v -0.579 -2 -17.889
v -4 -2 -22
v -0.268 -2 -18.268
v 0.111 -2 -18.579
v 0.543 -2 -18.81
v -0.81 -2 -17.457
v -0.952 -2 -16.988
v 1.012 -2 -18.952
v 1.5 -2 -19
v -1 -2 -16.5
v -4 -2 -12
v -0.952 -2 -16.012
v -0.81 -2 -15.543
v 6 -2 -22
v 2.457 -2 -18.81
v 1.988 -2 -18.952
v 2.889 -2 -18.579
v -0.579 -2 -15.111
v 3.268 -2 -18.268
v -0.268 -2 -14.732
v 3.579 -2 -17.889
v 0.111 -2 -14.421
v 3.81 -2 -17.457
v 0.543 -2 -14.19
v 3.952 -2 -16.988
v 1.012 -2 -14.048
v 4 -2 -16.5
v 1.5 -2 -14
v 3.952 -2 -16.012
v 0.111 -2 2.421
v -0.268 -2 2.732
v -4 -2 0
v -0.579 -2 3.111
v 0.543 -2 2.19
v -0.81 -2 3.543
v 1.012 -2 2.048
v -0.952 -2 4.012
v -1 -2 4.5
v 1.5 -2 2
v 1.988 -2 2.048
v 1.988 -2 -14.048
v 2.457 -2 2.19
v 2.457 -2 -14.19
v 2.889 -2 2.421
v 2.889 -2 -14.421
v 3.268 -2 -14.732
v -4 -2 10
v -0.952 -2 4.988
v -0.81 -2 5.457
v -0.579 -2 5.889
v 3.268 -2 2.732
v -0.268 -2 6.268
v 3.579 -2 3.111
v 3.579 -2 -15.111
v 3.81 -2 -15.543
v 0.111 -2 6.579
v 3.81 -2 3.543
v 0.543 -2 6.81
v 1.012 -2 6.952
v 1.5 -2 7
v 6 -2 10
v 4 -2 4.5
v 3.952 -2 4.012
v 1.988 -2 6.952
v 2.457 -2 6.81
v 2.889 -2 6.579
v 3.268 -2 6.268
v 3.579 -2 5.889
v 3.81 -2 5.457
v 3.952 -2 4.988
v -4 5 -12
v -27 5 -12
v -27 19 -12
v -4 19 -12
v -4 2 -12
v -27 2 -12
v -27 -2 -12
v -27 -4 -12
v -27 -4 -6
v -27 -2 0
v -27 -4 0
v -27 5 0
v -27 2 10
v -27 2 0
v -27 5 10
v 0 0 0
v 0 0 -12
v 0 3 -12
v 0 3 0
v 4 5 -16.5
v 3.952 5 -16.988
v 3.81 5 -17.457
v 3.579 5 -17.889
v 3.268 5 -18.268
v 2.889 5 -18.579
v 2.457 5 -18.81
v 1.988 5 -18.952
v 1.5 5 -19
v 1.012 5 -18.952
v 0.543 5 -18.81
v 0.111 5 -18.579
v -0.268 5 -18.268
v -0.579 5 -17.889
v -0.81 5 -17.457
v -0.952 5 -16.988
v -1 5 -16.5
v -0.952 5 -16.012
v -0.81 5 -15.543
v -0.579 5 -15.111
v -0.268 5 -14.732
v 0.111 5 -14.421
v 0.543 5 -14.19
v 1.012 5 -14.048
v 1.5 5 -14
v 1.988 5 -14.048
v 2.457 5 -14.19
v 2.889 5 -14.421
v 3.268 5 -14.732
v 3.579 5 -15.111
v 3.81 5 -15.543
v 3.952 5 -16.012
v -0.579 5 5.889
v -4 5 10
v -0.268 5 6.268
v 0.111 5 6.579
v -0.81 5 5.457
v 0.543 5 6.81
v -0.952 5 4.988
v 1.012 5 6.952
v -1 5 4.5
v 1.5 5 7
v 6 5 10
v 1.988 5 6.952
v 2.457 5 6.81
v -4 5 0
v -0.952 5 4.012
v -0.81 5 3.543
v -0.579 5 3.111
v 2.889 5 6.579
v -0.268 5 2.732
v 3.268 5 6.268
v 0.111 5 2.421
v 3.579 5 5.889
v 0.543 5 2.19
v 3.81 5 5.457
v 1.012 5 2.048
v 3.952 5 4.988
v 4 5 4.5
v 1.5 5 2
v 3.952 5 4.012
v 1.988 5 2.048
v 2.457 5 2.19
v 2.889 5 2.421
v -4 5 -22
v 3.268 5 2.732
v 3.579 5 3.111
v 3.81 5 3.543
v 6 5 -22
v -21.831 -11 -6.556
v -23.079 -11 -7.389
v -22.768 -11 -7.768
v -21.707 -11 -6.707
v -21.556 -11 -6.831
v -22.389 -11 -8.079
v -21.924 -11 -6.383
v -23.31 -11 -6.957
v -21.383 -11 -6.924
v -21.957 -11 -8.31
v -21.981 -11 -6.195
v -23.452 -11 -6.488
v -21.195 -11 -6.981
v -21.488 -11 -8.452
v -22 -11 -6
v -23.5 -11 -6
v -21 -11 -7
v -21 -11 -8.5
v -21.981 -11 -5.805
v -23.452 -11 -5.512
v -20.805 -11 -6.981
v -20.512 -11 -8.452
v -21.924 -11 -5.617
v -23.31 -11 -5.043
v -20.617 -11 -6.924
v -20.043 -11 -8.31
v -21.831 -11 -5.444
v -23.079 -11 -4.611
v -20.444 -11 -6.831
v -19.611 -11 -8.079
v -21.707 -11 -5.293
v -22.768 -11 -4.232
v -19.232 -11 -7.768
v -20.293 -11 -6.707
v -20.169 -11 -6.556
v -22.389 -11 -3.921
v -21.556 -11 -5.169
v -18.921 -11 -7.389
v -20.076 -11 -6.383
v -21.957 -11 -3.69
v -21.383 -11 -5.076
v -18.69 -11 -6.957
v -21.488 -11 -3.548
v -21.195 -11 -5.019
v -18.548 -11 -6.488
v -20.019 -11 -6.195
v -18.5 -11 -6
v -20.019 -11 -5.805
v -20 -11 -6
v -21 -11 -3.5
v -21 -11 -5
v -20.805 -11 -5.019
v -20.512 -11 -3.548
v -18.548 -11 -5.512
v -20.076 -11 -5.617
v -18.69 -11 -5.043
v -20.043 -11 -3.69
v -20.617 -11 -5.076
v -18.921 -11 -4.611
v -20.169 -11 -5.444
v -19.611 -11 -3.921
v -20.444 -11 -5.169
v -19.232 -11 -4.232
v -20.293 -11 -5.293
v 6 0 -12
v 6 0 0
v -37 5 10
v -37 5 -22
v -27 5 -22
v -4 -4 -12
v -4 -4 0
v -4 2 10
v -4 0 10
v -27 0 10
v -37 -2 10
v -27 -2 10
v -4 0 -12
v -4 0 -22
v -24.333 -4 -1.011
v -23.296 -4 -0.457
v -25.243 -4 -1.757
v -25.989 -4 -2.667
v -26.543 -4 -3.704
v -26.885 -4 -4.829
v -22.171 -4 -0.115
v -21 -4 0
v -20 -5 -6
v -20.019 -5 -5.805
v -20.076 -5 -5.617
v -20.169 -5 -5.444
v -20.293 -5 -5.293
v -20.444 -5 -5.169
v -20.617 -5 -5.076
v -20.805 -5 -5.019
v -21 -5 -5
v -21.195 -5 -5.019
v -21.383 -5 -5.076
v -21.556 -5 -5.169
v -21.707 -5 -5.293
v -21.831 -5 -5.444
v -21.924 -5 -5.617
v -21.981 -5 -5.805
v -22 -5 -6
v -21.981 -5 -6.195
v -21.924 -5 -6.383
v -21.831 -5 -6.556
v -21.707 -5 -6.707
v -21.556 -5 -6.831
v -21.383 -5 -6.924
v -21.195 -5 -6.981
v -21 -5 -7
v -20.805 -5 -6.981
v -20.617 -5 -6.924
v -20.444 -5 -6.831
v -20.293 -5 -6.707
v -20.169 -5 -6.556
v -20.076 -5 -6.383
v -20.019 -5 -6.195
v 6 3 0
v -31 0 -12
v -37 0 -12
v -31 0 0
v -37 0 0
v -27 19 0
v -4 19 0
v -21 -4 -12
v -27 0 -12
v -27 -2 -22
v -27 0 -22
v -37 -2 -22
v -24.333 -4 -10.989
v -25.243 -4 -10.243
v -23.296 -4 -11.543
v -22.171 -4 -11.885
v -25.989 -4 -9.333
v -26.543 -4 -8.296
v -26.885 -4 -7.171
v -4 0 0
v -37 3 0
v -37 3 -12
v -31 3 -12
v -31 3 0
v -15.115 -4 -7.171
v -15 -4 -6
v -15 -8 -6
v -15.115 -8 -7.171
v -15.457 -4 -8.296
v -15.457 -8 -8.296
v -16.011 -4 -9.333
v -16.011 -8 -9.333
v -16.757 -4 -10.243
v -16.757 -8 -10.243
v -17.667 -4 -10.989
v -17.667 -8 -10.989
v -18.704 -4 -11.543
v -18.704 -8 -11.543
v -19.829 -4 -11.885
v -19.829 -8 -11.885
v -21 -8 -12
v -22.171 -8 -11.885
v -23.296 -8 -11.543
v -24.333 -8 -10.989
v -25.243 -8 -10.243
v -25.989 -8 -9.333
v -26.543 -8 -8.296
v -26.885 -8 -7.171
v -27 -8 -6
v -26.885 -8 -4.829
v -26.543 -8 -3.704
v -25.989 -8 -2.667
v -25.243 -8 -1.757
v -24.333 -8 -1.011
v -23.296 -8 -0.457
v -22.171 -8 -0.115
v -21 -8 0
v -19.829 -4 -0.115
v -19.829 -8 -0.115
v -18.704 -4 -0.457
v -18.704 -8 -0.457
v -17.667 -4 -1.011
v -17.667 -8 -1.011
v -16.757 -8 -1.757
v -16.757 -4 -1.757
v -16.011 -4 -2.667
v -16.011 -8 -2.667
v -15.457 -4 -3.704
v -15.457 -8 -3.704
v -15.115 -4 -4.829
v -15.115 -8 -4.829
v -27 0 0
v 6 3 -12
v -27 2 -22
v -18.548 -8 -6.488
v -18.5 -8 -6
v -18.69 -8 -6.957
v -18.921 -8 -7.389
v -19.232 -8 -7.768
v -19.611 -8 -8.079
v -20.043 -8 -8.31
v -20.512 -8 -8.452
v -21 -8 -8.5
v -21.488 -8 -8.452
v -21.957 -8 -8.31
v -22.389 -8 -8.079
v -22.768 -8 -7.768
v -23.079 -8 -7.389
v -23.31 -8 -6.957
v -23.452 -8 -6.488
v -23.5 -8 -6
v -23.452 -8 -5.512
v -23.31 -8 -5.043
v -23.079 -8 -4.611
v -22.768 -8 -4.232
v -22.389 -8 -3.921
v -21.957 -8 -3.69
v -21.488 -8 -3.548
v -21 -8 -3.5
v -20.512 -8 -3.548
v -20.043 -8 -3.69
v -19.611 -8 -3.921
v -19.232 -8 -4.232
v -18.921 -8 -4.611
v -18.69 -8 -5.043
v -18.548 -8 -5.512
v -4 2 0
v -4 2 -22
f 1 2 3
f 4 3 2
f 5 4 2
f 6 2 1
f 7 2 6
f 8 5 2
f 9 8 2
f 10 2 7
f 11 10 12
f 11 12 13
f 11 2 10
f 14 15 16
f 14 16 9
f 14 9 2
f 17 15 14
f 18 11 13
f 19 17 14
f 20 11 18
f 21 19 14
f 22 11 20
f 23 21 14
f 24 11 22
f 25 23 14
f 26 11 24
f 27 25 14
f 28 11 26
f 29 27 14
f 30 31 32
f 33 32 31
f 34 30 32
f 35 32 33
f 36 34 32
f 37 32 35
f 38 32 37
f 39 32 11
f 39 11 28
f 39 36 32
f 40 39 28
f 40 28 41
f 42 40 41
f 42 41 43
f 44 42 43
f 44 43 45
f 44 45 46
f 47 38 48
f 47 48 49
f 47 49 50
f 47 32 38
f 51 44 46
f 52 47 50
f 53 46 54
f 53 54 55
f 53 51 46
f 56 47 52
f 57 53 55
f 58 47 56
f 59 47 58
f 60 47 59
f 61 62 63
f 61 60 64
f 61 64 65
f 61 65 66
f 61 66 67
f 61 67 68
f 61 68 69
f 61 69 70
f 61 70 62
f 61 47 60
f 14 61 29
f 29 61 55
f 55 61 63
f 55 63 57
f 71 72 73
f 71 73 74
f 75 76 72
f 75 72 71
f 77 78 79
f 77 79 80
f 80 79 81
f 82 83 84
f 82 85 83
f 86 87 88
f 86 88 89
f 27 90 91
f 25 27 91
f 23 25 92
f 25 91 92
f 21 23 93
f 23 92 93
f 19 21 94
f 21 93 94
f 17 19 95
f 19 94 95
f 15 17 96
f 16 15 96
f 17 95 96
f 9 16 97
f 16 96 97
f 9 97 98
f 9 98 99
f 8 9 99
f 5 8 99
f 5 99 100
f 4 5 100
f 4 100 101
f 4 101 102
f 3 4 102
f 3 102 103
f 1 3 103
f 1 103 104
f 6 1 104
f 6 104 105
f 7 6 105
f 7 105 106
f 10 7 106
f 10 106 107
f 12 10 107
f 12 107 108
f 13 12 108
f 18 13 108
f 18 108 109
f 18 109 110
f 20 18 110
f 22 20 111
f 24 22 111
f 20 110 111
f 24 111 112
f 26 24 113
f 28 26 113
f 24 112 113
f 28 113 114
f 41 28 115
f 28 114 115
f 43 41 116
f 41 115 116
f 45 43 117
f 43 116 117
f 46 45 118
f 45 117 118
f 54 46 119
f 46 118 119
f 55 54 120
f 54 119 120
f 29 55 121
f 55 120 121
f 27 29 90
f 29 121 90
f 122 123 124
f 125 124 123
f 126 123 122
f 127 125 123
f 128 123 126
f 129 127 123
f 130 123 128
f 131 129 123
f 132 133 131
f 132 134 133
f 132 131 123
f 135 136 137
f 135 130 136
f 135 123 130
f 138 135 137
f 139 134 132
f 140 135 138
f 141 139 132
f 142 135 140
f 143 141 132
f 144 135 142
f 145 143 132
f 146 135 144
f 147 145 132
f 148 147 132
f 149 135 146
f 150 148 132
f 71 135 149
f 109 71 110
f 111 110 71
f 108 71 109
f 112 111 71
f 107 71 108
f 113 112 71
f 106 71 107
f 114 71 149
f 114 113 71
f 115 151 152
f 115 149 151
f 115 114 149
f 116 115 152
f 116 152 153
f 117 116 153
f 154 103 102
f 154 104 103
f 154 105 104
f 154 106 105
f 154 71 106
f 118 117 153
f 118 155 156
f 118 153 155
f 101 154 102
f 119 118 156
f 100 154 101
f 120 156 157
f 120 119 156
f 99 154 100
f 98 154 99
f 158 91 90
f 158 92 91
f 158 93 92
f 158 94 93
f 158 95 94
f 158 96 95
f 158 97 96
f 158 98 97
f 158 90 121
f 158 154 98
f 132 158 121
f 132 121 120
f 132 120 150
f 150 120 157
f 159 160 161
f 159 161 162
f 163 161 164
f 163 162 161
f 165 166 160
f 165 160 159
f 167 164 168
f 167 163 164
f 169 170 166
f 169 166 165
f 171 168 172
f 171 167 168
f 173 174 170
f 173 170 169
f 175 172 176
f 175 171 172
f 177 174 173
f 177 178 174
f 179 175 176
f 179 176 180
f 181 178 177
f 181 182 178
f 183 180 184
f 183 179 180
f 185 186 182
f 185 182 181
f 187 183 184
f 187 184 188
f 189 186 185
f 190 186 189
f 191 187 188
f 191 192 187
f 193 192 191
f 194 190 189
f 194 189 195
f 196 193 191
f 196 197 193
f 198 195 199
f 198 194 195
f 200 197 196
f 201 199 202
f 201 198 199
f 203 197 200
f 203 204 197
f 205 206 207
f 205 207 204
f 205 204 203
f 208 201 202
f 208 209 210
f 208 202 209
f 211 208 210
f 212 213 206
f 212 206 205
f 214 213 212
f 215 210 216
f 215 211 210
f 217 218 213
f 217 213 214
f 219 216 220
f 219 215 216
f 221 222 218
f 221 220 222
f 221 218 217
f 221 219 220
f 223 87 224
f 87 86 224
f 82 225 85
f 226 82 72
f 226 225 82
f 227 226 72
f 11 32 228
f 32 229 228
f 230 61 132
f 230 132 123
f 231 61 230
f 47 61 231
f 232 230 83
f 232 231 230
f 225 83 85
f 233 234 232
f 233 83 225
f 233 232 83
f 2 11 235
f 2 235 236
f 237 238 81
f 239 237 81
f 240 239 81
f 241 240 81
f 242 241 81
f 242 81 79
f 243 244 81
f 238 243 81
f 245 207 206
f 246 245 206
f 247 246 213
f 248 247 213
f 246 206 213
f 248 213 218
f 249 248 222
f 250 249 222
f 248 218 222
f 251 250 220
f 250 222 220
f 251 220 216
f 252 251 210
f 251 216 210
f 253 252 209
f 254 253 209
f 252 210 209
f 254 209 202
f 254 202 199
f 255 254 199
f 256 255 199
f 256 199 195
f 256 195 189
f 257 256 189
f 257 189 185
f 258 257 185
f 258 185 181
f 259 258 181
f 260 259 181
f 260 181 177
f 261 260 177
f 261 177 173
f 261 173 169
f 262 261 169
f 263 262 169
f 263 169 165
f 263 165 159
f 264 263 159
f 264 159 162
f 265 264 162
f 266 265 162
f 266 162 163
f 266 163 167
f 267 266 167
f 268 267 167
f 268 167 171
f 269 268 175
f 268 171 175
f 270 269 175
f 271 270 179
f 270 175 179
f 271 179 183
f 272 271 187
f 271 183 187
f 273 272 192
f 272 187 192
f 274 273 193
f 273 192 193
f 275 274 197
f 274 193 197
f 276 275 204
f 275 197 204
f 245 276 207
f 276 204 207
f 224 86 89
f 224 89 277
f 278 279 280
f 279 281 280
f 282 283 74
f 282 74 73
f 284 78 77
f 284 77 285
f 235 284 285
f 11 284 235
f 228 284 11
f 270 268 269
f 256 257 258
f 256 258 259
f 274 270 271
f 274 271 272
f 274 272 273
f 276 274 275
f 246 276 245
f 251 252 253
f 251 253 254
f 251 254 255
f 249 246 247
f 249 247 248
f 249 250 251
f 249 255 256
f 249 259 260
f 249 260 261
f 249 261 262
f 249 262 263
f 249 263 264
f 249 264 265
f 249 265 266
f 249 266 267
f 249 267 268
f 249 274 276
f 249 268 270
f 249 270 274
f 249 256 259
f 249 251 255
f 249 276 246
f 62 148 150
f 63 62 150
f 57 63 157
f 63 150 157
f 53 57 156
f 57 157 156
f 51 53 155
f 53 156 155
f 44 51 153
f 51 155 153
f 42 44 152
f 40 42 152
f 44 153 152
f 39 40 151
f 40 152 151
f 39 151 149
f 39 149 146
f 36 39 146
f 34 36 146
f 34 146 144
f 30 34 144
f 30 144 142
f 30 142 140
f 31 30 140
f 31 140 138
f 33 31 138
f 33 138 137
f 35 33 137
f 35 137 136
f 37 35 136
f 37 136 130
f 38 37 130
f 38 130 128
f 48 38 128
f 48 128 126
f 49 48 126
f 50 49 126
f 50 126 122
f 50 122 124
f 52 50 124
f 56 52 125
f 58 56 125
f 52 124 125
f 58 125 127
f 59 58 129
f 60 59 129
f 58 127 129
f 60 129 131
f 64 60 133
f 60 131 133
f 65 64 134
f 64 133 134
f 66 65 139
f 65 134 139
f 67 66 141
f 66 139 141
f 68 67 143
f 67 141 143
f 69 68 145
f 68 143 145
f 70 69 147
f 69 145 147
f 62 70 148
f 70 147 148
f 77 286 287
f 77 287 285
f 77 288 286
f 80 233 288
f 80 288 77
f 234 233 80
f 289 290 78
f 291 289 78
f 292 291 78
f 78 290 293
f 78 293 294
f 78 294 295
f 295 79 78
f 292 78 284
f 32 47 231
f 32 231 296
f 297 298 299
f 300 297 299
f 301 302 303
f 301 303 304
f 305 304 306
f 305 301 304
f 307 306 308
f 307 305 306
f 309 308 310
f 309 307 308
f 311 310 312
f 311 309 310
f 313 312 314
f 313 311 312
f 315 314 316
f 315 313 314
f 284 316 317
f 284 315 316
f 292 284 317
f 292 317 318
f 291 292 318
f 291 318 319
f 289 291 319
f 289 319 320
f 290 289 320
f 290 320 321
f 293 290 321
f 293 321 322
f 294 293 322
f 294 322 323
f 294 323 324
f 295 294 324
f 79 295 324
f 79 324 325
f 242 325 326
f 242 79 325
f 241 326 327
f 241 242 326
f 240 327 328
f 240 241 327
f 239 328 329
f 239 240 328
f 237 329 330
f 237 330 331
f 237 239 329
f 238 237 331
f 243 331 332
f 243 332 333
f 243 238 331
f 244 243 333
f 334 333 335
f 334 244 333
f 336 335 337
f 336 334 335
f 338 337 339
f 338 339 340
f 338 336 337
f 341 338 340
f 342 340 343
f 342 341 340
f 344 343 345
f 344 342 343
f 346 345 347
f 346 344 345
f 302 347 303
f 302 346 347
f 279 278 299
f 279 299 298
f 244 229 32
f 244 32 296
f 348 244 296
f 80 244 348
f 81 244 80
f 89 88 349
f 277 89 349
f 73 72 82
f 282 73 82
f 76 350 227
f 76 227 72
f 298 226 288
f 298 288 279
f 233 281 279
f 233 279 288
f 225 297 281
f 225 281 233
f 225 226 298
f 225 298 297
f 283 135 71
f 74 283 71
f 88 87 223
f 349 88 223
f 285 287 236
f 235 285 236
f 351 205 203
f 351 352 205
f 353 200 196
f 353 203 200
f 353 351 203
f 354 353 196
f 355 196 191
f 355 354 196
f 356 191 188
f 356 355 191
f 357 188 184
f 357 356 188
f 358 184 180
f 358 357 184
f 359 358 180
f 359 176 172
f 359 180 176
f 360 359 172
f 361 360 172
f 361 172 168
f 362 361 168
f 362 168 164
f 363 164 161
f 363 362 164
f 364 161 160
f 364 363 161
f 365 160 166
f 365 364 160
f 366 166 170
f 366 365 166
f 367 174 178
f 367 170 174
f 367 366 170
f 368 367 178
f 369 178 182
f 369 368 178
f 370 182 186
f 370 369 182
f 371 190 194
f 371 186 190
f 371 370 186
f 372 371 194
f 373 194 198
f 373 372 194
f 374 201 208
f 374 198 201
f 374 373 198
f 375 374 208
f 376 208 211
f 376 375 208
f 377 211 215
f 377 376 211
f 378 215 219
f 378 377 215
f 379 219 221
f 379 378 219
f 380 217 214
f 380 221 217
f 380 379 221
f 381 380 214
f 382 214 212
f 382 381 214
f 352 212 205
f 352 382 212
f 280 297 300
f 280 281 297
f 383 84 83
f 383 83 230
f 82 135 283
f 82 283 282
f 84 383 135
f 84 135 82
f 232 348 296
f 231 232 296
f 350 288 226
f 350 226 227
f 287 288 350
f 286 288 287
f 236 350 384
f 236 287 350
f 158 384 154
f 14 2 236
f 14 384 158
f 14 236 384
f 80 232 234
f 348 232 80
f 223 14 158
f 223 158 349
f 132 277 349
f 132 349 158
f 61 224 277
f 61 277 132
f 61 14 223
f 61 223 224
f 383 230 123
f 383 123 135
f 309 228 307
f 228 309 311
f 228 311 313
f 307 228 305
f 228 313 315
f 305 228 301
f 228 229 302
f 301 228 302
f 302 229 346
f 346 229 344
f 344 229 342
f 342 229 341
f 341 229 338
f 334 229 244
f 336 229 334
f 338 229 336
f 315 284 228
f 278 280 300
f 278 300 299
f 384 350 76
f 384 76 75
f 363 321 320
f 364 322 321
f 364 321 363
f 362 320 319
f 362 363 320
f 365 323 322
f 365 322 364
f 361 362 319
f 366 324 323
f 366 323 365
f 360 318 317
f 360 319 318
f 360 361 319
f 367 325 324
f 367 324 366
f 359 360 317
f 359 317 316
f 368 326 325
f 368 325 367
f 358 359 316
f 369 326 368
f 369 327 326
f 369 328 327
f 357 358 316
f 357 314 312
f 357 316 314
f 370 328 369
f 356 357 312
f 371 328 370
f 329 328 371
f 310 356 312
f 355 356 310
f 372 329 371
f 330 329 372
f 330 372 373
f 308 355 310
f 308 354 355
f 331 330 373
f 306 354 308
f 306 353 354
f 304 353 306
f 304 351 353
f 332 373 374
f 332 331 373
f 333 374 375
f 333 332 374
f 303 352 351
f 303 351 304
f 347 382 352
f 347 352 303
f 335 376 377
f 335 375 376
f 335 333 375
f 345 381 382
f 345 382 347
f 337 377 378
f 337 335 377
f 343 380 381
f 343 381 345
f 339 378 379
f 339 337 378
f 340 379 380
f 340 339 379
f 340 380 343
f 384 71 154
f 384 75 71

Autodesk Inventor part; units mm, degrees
ref_plane "YZ Plane" through (0, 0, 0) normal (1, 0, 0) x (0, 1, 0)
ref_plane "XZ Plane" through (0, 0, 0) normal (0, 1, 0) x (-1, 0, 0)
ref_plane "XY Plane" through (0, 0, 0) normal (0, 0, 1) x (1, 0, 0)
sketch "Sketch1" plane through (0, 0, 0) normal (0, 1, 0) x (-1, 0, 0)
  line L0 (0, 0) -> (31, 0)
  line L1 (31, 0) -> (31, -12)
  line L2 (31, -12) -> (0, -12)
  line L3 (0, -12) -> (0, 0)
  line L4 (4, -12) -> (27, -12)
  line L5 (27, -12) -> (27, 0)
  line L6 (27, 0) -> (4, 0)
  line L7 (4, 0) -> (4, -12)
  point P0 (27, 0)
  point P1 (4, 0)
  dimension "d230" = 31
  dimension "d231" = 12
  dimension "d232" = 23
  dimension "d234" = 4
extrude "Extrusion1" add sketch "Sketch1" along normal blind 3 contours L0 L7 L2 L3 | L0 L1 L2 L5
extrude "Extrusion2" add sketch "Sketch1" along normal blind 19 and the other way blind 4 contours L0 L5 L2 L7
sketch "Sketch2" plane through (0, 3, 0) normal (0, 1, 0) x (1, 0, 0)
  line L0 (-27, -10) -> (-37, -10)
  line L1 (-37, -10) -> (-37, 22)
  line L2 (-37, 22) -> (-27, 22)
  line L3 (-27, 22) -> (-27, -10)
  line L4 (-27, 12) -> (-27, 0) projected
  line L5 (-4, 22) -> (6, 22)
  line L6 (6, 22) -> (6, -10)
  line L7 (6, -10) -> (-4, -10)
  line L8 (-4, -10) -> (-4, 22)
  line L9 (-4, 0) -> (-4, 12) projected
  point P0 (0, 0)
  point P1 (-27, 6)
  point P2 (-27, 6)
  point P3 (-27, 6)
  point P4 (-4, 6)
  point P5 (-4, 6)
  point P6 (-4, 6)
  dimension "d241" = 10
  dimension "d242" = 32
  dimension "d243" = 10
  dimension "d244" = 32
extrude "Extrusion3" add sketch "Sketch2" along normal blind 2
sketch "Sketch3" plane through (0, 0, 0) normal (0, -1, 0) x (1, 0, 0)
  line L0 (-37, -22) -> (-37, 10) projected
  line L1 (-27, -12) -> (-27, -22) projected
  line L2 (-37, 10) -> (-27, 10)
  line L3 (-27, 10) -> (-27, -22)
  line L4 (-27, -22) -> (-37, -22)
  line L5 (-37, -22) -> (-37, 10)
  line L6 (6, -22) -> (-4, -22) projected
  line L7 (6, 10) -> (6, -22) projected
  line L8 (-4, -22) -> (6, -22)
  line L9 (6, -22) -> (6, 10)
  line L10 (6, 10) -> (-4, 10)
  line L11 (-4, 10) -> (-4, -22)
  point P0 (0, 0)
extrude "Extrusion4" add sketch "Sketch3" along normal blind 2
sketch "Sketch4" plane through (0, 0, 0) normal (0, 1, 0) x (1, 0, 0)
  line L0 (-4, 22) -> (-4, 12) projected
  line L1 (6, -10) -> (-4, -10)
  line L2 (-4, 22) -> (6, 22)
  line L3 (-27, 22) -> (-37, 22) projected
  line L4 (-27, 22) -> (-37, 22)
  line L5 (-37, 22) -> (-37, -10)
  line L6 (-37, -10) -> (-27, -10)
  line L7 (-4, 0) -> (-27, 0) projected
  line L8 (6, -10) -> (-4, -10)
  line L9 (-4, -10) -> (-4, 0)
  line L10 (-4, 0) -> (6, 0)
  line L11 (6, 0) -> (6, -10)
  line L12 (-27, -10) -> (-37, -10)
  line L13 (-37, -10) -> (-37, 0)
  line L14 (-37, 0) -> (-27, 0)
  line L15 (-27, 0) -> (-27, -10)
  line L16 (-27, 12) -> (-37, 12)
  line L17 (-37, 12) -> (-37, 22)
  line L18 (-37, 22) -> (-27, 22)
  line L19 (-27, 22) -> (-27, 12)
  line L20 (0, 12) -> (-4, 12) projected
  line L21 (-4, 22) -> (6, 22) projected
  line L22 (-4, 12) -> (6, 12)
  line L23 (6, 12) -> (6, 22)
  line L24 (6, 22) -> (-4, 22)
  line L25 (-4, 22) -> (-4, 12)
  line L26 (-37, 22) -> (-37, -10) projected
  line L27 (-37, 22) -> (6, 22)
  line L28 (6, 22) -> (6, 12)
  line L29 (6, 12) -> (-37, 12)
  line L30 (-37, 12) -> (-37, 22)
  line L31 (6, -10) -> (-37, -10)
  line L32 (-37, -10) -> (-37, 0)
  line L33 (-37, 0) -> (6, 0)
  line L34 (6, 0) -> (6, -10)
  point P0 (0, 0)
extrude "Extrusion5" add sketch "Sketch4" along normal blind 3 contours L2 L23 L22 L20 L0 | L14 L15 L6 L5 | L19 L16 L5 L3 | L10 L11 L1 L9
extrude "Extrusion6" add sketch "Sketch4" along normal blind 2
sketch "Sketch5" plane through (0, -4, 0) normal (0, -1, 0) x (1, 0, 0)
  circle A0 centre (-21, -6) radius 6
  line L0 (-4, 0) -> (-27, 0) projected
  line L1 (-27, 0) -> (-27, -12) projected
  point P0 (0, 0)
  dimension "d255" = 12
  dimension "d256" = 6
  dimension "d257" = 6
extrude "Extrusion7" add sketch "Sketch5" along normal blind 4 contours A0
sketch "Sketch6" plane through (-21, -8, -6) normal (0, -1, 0) x (1, 0, 0)
  circle A0 centre (0, 0) radius 2.5
  circle A1 centre (0, 0) radius 6 projected
  point P0 (21, 6)
  dimension "d260" = 5
  dimension "d261" = 3.5
extrude "Extrusion8" add sketch "Sketch6" along normal blind 3 contours A0
sketch "Sketch7" plane through (-21, -11, -6) normal (0, -1, 0) x (1, 0, 0)
  line L0 (-6, -6) -> (0, -6) projected
  line L1 (-6, 6) -> (-6, 0) projected
  circle A0 centre (0, 0) radius 1
  point P0 (21, 6)
  dimension "d266" = 2
  dimension "d267" = 6
  dimension "d268" = 6
extrude "Extrusion9" cut sketch "Sketch7" against normal blind 6
sketch "Sketch22" plane through (0, 5, 0) normal (0, 1, 0) x (1, 0, 0)
  circle A0 centre (1.5, -4.5) radius 2.5
  circle A1 centre (1.5, 16.5) radius 2.5
  line L0 (-4, 22) -> (-4, 12) projected
  line L1 (-4, 0) -> (-4, 12) projected
  line L2 (-27, 0) -> (-27, 6) projected
  line L3 (-4, 6) -> (-27, 6)
  point P0 (0, 0)
  dimension "d271" = 5
  dimension "d272" = 5
  dimension "d273" = 21
  dimension "d274" = 5.5
extrude "Extrusion26" cut sketch "Sketch22" against normal blind 8
properties part number "Langbektang houder"
